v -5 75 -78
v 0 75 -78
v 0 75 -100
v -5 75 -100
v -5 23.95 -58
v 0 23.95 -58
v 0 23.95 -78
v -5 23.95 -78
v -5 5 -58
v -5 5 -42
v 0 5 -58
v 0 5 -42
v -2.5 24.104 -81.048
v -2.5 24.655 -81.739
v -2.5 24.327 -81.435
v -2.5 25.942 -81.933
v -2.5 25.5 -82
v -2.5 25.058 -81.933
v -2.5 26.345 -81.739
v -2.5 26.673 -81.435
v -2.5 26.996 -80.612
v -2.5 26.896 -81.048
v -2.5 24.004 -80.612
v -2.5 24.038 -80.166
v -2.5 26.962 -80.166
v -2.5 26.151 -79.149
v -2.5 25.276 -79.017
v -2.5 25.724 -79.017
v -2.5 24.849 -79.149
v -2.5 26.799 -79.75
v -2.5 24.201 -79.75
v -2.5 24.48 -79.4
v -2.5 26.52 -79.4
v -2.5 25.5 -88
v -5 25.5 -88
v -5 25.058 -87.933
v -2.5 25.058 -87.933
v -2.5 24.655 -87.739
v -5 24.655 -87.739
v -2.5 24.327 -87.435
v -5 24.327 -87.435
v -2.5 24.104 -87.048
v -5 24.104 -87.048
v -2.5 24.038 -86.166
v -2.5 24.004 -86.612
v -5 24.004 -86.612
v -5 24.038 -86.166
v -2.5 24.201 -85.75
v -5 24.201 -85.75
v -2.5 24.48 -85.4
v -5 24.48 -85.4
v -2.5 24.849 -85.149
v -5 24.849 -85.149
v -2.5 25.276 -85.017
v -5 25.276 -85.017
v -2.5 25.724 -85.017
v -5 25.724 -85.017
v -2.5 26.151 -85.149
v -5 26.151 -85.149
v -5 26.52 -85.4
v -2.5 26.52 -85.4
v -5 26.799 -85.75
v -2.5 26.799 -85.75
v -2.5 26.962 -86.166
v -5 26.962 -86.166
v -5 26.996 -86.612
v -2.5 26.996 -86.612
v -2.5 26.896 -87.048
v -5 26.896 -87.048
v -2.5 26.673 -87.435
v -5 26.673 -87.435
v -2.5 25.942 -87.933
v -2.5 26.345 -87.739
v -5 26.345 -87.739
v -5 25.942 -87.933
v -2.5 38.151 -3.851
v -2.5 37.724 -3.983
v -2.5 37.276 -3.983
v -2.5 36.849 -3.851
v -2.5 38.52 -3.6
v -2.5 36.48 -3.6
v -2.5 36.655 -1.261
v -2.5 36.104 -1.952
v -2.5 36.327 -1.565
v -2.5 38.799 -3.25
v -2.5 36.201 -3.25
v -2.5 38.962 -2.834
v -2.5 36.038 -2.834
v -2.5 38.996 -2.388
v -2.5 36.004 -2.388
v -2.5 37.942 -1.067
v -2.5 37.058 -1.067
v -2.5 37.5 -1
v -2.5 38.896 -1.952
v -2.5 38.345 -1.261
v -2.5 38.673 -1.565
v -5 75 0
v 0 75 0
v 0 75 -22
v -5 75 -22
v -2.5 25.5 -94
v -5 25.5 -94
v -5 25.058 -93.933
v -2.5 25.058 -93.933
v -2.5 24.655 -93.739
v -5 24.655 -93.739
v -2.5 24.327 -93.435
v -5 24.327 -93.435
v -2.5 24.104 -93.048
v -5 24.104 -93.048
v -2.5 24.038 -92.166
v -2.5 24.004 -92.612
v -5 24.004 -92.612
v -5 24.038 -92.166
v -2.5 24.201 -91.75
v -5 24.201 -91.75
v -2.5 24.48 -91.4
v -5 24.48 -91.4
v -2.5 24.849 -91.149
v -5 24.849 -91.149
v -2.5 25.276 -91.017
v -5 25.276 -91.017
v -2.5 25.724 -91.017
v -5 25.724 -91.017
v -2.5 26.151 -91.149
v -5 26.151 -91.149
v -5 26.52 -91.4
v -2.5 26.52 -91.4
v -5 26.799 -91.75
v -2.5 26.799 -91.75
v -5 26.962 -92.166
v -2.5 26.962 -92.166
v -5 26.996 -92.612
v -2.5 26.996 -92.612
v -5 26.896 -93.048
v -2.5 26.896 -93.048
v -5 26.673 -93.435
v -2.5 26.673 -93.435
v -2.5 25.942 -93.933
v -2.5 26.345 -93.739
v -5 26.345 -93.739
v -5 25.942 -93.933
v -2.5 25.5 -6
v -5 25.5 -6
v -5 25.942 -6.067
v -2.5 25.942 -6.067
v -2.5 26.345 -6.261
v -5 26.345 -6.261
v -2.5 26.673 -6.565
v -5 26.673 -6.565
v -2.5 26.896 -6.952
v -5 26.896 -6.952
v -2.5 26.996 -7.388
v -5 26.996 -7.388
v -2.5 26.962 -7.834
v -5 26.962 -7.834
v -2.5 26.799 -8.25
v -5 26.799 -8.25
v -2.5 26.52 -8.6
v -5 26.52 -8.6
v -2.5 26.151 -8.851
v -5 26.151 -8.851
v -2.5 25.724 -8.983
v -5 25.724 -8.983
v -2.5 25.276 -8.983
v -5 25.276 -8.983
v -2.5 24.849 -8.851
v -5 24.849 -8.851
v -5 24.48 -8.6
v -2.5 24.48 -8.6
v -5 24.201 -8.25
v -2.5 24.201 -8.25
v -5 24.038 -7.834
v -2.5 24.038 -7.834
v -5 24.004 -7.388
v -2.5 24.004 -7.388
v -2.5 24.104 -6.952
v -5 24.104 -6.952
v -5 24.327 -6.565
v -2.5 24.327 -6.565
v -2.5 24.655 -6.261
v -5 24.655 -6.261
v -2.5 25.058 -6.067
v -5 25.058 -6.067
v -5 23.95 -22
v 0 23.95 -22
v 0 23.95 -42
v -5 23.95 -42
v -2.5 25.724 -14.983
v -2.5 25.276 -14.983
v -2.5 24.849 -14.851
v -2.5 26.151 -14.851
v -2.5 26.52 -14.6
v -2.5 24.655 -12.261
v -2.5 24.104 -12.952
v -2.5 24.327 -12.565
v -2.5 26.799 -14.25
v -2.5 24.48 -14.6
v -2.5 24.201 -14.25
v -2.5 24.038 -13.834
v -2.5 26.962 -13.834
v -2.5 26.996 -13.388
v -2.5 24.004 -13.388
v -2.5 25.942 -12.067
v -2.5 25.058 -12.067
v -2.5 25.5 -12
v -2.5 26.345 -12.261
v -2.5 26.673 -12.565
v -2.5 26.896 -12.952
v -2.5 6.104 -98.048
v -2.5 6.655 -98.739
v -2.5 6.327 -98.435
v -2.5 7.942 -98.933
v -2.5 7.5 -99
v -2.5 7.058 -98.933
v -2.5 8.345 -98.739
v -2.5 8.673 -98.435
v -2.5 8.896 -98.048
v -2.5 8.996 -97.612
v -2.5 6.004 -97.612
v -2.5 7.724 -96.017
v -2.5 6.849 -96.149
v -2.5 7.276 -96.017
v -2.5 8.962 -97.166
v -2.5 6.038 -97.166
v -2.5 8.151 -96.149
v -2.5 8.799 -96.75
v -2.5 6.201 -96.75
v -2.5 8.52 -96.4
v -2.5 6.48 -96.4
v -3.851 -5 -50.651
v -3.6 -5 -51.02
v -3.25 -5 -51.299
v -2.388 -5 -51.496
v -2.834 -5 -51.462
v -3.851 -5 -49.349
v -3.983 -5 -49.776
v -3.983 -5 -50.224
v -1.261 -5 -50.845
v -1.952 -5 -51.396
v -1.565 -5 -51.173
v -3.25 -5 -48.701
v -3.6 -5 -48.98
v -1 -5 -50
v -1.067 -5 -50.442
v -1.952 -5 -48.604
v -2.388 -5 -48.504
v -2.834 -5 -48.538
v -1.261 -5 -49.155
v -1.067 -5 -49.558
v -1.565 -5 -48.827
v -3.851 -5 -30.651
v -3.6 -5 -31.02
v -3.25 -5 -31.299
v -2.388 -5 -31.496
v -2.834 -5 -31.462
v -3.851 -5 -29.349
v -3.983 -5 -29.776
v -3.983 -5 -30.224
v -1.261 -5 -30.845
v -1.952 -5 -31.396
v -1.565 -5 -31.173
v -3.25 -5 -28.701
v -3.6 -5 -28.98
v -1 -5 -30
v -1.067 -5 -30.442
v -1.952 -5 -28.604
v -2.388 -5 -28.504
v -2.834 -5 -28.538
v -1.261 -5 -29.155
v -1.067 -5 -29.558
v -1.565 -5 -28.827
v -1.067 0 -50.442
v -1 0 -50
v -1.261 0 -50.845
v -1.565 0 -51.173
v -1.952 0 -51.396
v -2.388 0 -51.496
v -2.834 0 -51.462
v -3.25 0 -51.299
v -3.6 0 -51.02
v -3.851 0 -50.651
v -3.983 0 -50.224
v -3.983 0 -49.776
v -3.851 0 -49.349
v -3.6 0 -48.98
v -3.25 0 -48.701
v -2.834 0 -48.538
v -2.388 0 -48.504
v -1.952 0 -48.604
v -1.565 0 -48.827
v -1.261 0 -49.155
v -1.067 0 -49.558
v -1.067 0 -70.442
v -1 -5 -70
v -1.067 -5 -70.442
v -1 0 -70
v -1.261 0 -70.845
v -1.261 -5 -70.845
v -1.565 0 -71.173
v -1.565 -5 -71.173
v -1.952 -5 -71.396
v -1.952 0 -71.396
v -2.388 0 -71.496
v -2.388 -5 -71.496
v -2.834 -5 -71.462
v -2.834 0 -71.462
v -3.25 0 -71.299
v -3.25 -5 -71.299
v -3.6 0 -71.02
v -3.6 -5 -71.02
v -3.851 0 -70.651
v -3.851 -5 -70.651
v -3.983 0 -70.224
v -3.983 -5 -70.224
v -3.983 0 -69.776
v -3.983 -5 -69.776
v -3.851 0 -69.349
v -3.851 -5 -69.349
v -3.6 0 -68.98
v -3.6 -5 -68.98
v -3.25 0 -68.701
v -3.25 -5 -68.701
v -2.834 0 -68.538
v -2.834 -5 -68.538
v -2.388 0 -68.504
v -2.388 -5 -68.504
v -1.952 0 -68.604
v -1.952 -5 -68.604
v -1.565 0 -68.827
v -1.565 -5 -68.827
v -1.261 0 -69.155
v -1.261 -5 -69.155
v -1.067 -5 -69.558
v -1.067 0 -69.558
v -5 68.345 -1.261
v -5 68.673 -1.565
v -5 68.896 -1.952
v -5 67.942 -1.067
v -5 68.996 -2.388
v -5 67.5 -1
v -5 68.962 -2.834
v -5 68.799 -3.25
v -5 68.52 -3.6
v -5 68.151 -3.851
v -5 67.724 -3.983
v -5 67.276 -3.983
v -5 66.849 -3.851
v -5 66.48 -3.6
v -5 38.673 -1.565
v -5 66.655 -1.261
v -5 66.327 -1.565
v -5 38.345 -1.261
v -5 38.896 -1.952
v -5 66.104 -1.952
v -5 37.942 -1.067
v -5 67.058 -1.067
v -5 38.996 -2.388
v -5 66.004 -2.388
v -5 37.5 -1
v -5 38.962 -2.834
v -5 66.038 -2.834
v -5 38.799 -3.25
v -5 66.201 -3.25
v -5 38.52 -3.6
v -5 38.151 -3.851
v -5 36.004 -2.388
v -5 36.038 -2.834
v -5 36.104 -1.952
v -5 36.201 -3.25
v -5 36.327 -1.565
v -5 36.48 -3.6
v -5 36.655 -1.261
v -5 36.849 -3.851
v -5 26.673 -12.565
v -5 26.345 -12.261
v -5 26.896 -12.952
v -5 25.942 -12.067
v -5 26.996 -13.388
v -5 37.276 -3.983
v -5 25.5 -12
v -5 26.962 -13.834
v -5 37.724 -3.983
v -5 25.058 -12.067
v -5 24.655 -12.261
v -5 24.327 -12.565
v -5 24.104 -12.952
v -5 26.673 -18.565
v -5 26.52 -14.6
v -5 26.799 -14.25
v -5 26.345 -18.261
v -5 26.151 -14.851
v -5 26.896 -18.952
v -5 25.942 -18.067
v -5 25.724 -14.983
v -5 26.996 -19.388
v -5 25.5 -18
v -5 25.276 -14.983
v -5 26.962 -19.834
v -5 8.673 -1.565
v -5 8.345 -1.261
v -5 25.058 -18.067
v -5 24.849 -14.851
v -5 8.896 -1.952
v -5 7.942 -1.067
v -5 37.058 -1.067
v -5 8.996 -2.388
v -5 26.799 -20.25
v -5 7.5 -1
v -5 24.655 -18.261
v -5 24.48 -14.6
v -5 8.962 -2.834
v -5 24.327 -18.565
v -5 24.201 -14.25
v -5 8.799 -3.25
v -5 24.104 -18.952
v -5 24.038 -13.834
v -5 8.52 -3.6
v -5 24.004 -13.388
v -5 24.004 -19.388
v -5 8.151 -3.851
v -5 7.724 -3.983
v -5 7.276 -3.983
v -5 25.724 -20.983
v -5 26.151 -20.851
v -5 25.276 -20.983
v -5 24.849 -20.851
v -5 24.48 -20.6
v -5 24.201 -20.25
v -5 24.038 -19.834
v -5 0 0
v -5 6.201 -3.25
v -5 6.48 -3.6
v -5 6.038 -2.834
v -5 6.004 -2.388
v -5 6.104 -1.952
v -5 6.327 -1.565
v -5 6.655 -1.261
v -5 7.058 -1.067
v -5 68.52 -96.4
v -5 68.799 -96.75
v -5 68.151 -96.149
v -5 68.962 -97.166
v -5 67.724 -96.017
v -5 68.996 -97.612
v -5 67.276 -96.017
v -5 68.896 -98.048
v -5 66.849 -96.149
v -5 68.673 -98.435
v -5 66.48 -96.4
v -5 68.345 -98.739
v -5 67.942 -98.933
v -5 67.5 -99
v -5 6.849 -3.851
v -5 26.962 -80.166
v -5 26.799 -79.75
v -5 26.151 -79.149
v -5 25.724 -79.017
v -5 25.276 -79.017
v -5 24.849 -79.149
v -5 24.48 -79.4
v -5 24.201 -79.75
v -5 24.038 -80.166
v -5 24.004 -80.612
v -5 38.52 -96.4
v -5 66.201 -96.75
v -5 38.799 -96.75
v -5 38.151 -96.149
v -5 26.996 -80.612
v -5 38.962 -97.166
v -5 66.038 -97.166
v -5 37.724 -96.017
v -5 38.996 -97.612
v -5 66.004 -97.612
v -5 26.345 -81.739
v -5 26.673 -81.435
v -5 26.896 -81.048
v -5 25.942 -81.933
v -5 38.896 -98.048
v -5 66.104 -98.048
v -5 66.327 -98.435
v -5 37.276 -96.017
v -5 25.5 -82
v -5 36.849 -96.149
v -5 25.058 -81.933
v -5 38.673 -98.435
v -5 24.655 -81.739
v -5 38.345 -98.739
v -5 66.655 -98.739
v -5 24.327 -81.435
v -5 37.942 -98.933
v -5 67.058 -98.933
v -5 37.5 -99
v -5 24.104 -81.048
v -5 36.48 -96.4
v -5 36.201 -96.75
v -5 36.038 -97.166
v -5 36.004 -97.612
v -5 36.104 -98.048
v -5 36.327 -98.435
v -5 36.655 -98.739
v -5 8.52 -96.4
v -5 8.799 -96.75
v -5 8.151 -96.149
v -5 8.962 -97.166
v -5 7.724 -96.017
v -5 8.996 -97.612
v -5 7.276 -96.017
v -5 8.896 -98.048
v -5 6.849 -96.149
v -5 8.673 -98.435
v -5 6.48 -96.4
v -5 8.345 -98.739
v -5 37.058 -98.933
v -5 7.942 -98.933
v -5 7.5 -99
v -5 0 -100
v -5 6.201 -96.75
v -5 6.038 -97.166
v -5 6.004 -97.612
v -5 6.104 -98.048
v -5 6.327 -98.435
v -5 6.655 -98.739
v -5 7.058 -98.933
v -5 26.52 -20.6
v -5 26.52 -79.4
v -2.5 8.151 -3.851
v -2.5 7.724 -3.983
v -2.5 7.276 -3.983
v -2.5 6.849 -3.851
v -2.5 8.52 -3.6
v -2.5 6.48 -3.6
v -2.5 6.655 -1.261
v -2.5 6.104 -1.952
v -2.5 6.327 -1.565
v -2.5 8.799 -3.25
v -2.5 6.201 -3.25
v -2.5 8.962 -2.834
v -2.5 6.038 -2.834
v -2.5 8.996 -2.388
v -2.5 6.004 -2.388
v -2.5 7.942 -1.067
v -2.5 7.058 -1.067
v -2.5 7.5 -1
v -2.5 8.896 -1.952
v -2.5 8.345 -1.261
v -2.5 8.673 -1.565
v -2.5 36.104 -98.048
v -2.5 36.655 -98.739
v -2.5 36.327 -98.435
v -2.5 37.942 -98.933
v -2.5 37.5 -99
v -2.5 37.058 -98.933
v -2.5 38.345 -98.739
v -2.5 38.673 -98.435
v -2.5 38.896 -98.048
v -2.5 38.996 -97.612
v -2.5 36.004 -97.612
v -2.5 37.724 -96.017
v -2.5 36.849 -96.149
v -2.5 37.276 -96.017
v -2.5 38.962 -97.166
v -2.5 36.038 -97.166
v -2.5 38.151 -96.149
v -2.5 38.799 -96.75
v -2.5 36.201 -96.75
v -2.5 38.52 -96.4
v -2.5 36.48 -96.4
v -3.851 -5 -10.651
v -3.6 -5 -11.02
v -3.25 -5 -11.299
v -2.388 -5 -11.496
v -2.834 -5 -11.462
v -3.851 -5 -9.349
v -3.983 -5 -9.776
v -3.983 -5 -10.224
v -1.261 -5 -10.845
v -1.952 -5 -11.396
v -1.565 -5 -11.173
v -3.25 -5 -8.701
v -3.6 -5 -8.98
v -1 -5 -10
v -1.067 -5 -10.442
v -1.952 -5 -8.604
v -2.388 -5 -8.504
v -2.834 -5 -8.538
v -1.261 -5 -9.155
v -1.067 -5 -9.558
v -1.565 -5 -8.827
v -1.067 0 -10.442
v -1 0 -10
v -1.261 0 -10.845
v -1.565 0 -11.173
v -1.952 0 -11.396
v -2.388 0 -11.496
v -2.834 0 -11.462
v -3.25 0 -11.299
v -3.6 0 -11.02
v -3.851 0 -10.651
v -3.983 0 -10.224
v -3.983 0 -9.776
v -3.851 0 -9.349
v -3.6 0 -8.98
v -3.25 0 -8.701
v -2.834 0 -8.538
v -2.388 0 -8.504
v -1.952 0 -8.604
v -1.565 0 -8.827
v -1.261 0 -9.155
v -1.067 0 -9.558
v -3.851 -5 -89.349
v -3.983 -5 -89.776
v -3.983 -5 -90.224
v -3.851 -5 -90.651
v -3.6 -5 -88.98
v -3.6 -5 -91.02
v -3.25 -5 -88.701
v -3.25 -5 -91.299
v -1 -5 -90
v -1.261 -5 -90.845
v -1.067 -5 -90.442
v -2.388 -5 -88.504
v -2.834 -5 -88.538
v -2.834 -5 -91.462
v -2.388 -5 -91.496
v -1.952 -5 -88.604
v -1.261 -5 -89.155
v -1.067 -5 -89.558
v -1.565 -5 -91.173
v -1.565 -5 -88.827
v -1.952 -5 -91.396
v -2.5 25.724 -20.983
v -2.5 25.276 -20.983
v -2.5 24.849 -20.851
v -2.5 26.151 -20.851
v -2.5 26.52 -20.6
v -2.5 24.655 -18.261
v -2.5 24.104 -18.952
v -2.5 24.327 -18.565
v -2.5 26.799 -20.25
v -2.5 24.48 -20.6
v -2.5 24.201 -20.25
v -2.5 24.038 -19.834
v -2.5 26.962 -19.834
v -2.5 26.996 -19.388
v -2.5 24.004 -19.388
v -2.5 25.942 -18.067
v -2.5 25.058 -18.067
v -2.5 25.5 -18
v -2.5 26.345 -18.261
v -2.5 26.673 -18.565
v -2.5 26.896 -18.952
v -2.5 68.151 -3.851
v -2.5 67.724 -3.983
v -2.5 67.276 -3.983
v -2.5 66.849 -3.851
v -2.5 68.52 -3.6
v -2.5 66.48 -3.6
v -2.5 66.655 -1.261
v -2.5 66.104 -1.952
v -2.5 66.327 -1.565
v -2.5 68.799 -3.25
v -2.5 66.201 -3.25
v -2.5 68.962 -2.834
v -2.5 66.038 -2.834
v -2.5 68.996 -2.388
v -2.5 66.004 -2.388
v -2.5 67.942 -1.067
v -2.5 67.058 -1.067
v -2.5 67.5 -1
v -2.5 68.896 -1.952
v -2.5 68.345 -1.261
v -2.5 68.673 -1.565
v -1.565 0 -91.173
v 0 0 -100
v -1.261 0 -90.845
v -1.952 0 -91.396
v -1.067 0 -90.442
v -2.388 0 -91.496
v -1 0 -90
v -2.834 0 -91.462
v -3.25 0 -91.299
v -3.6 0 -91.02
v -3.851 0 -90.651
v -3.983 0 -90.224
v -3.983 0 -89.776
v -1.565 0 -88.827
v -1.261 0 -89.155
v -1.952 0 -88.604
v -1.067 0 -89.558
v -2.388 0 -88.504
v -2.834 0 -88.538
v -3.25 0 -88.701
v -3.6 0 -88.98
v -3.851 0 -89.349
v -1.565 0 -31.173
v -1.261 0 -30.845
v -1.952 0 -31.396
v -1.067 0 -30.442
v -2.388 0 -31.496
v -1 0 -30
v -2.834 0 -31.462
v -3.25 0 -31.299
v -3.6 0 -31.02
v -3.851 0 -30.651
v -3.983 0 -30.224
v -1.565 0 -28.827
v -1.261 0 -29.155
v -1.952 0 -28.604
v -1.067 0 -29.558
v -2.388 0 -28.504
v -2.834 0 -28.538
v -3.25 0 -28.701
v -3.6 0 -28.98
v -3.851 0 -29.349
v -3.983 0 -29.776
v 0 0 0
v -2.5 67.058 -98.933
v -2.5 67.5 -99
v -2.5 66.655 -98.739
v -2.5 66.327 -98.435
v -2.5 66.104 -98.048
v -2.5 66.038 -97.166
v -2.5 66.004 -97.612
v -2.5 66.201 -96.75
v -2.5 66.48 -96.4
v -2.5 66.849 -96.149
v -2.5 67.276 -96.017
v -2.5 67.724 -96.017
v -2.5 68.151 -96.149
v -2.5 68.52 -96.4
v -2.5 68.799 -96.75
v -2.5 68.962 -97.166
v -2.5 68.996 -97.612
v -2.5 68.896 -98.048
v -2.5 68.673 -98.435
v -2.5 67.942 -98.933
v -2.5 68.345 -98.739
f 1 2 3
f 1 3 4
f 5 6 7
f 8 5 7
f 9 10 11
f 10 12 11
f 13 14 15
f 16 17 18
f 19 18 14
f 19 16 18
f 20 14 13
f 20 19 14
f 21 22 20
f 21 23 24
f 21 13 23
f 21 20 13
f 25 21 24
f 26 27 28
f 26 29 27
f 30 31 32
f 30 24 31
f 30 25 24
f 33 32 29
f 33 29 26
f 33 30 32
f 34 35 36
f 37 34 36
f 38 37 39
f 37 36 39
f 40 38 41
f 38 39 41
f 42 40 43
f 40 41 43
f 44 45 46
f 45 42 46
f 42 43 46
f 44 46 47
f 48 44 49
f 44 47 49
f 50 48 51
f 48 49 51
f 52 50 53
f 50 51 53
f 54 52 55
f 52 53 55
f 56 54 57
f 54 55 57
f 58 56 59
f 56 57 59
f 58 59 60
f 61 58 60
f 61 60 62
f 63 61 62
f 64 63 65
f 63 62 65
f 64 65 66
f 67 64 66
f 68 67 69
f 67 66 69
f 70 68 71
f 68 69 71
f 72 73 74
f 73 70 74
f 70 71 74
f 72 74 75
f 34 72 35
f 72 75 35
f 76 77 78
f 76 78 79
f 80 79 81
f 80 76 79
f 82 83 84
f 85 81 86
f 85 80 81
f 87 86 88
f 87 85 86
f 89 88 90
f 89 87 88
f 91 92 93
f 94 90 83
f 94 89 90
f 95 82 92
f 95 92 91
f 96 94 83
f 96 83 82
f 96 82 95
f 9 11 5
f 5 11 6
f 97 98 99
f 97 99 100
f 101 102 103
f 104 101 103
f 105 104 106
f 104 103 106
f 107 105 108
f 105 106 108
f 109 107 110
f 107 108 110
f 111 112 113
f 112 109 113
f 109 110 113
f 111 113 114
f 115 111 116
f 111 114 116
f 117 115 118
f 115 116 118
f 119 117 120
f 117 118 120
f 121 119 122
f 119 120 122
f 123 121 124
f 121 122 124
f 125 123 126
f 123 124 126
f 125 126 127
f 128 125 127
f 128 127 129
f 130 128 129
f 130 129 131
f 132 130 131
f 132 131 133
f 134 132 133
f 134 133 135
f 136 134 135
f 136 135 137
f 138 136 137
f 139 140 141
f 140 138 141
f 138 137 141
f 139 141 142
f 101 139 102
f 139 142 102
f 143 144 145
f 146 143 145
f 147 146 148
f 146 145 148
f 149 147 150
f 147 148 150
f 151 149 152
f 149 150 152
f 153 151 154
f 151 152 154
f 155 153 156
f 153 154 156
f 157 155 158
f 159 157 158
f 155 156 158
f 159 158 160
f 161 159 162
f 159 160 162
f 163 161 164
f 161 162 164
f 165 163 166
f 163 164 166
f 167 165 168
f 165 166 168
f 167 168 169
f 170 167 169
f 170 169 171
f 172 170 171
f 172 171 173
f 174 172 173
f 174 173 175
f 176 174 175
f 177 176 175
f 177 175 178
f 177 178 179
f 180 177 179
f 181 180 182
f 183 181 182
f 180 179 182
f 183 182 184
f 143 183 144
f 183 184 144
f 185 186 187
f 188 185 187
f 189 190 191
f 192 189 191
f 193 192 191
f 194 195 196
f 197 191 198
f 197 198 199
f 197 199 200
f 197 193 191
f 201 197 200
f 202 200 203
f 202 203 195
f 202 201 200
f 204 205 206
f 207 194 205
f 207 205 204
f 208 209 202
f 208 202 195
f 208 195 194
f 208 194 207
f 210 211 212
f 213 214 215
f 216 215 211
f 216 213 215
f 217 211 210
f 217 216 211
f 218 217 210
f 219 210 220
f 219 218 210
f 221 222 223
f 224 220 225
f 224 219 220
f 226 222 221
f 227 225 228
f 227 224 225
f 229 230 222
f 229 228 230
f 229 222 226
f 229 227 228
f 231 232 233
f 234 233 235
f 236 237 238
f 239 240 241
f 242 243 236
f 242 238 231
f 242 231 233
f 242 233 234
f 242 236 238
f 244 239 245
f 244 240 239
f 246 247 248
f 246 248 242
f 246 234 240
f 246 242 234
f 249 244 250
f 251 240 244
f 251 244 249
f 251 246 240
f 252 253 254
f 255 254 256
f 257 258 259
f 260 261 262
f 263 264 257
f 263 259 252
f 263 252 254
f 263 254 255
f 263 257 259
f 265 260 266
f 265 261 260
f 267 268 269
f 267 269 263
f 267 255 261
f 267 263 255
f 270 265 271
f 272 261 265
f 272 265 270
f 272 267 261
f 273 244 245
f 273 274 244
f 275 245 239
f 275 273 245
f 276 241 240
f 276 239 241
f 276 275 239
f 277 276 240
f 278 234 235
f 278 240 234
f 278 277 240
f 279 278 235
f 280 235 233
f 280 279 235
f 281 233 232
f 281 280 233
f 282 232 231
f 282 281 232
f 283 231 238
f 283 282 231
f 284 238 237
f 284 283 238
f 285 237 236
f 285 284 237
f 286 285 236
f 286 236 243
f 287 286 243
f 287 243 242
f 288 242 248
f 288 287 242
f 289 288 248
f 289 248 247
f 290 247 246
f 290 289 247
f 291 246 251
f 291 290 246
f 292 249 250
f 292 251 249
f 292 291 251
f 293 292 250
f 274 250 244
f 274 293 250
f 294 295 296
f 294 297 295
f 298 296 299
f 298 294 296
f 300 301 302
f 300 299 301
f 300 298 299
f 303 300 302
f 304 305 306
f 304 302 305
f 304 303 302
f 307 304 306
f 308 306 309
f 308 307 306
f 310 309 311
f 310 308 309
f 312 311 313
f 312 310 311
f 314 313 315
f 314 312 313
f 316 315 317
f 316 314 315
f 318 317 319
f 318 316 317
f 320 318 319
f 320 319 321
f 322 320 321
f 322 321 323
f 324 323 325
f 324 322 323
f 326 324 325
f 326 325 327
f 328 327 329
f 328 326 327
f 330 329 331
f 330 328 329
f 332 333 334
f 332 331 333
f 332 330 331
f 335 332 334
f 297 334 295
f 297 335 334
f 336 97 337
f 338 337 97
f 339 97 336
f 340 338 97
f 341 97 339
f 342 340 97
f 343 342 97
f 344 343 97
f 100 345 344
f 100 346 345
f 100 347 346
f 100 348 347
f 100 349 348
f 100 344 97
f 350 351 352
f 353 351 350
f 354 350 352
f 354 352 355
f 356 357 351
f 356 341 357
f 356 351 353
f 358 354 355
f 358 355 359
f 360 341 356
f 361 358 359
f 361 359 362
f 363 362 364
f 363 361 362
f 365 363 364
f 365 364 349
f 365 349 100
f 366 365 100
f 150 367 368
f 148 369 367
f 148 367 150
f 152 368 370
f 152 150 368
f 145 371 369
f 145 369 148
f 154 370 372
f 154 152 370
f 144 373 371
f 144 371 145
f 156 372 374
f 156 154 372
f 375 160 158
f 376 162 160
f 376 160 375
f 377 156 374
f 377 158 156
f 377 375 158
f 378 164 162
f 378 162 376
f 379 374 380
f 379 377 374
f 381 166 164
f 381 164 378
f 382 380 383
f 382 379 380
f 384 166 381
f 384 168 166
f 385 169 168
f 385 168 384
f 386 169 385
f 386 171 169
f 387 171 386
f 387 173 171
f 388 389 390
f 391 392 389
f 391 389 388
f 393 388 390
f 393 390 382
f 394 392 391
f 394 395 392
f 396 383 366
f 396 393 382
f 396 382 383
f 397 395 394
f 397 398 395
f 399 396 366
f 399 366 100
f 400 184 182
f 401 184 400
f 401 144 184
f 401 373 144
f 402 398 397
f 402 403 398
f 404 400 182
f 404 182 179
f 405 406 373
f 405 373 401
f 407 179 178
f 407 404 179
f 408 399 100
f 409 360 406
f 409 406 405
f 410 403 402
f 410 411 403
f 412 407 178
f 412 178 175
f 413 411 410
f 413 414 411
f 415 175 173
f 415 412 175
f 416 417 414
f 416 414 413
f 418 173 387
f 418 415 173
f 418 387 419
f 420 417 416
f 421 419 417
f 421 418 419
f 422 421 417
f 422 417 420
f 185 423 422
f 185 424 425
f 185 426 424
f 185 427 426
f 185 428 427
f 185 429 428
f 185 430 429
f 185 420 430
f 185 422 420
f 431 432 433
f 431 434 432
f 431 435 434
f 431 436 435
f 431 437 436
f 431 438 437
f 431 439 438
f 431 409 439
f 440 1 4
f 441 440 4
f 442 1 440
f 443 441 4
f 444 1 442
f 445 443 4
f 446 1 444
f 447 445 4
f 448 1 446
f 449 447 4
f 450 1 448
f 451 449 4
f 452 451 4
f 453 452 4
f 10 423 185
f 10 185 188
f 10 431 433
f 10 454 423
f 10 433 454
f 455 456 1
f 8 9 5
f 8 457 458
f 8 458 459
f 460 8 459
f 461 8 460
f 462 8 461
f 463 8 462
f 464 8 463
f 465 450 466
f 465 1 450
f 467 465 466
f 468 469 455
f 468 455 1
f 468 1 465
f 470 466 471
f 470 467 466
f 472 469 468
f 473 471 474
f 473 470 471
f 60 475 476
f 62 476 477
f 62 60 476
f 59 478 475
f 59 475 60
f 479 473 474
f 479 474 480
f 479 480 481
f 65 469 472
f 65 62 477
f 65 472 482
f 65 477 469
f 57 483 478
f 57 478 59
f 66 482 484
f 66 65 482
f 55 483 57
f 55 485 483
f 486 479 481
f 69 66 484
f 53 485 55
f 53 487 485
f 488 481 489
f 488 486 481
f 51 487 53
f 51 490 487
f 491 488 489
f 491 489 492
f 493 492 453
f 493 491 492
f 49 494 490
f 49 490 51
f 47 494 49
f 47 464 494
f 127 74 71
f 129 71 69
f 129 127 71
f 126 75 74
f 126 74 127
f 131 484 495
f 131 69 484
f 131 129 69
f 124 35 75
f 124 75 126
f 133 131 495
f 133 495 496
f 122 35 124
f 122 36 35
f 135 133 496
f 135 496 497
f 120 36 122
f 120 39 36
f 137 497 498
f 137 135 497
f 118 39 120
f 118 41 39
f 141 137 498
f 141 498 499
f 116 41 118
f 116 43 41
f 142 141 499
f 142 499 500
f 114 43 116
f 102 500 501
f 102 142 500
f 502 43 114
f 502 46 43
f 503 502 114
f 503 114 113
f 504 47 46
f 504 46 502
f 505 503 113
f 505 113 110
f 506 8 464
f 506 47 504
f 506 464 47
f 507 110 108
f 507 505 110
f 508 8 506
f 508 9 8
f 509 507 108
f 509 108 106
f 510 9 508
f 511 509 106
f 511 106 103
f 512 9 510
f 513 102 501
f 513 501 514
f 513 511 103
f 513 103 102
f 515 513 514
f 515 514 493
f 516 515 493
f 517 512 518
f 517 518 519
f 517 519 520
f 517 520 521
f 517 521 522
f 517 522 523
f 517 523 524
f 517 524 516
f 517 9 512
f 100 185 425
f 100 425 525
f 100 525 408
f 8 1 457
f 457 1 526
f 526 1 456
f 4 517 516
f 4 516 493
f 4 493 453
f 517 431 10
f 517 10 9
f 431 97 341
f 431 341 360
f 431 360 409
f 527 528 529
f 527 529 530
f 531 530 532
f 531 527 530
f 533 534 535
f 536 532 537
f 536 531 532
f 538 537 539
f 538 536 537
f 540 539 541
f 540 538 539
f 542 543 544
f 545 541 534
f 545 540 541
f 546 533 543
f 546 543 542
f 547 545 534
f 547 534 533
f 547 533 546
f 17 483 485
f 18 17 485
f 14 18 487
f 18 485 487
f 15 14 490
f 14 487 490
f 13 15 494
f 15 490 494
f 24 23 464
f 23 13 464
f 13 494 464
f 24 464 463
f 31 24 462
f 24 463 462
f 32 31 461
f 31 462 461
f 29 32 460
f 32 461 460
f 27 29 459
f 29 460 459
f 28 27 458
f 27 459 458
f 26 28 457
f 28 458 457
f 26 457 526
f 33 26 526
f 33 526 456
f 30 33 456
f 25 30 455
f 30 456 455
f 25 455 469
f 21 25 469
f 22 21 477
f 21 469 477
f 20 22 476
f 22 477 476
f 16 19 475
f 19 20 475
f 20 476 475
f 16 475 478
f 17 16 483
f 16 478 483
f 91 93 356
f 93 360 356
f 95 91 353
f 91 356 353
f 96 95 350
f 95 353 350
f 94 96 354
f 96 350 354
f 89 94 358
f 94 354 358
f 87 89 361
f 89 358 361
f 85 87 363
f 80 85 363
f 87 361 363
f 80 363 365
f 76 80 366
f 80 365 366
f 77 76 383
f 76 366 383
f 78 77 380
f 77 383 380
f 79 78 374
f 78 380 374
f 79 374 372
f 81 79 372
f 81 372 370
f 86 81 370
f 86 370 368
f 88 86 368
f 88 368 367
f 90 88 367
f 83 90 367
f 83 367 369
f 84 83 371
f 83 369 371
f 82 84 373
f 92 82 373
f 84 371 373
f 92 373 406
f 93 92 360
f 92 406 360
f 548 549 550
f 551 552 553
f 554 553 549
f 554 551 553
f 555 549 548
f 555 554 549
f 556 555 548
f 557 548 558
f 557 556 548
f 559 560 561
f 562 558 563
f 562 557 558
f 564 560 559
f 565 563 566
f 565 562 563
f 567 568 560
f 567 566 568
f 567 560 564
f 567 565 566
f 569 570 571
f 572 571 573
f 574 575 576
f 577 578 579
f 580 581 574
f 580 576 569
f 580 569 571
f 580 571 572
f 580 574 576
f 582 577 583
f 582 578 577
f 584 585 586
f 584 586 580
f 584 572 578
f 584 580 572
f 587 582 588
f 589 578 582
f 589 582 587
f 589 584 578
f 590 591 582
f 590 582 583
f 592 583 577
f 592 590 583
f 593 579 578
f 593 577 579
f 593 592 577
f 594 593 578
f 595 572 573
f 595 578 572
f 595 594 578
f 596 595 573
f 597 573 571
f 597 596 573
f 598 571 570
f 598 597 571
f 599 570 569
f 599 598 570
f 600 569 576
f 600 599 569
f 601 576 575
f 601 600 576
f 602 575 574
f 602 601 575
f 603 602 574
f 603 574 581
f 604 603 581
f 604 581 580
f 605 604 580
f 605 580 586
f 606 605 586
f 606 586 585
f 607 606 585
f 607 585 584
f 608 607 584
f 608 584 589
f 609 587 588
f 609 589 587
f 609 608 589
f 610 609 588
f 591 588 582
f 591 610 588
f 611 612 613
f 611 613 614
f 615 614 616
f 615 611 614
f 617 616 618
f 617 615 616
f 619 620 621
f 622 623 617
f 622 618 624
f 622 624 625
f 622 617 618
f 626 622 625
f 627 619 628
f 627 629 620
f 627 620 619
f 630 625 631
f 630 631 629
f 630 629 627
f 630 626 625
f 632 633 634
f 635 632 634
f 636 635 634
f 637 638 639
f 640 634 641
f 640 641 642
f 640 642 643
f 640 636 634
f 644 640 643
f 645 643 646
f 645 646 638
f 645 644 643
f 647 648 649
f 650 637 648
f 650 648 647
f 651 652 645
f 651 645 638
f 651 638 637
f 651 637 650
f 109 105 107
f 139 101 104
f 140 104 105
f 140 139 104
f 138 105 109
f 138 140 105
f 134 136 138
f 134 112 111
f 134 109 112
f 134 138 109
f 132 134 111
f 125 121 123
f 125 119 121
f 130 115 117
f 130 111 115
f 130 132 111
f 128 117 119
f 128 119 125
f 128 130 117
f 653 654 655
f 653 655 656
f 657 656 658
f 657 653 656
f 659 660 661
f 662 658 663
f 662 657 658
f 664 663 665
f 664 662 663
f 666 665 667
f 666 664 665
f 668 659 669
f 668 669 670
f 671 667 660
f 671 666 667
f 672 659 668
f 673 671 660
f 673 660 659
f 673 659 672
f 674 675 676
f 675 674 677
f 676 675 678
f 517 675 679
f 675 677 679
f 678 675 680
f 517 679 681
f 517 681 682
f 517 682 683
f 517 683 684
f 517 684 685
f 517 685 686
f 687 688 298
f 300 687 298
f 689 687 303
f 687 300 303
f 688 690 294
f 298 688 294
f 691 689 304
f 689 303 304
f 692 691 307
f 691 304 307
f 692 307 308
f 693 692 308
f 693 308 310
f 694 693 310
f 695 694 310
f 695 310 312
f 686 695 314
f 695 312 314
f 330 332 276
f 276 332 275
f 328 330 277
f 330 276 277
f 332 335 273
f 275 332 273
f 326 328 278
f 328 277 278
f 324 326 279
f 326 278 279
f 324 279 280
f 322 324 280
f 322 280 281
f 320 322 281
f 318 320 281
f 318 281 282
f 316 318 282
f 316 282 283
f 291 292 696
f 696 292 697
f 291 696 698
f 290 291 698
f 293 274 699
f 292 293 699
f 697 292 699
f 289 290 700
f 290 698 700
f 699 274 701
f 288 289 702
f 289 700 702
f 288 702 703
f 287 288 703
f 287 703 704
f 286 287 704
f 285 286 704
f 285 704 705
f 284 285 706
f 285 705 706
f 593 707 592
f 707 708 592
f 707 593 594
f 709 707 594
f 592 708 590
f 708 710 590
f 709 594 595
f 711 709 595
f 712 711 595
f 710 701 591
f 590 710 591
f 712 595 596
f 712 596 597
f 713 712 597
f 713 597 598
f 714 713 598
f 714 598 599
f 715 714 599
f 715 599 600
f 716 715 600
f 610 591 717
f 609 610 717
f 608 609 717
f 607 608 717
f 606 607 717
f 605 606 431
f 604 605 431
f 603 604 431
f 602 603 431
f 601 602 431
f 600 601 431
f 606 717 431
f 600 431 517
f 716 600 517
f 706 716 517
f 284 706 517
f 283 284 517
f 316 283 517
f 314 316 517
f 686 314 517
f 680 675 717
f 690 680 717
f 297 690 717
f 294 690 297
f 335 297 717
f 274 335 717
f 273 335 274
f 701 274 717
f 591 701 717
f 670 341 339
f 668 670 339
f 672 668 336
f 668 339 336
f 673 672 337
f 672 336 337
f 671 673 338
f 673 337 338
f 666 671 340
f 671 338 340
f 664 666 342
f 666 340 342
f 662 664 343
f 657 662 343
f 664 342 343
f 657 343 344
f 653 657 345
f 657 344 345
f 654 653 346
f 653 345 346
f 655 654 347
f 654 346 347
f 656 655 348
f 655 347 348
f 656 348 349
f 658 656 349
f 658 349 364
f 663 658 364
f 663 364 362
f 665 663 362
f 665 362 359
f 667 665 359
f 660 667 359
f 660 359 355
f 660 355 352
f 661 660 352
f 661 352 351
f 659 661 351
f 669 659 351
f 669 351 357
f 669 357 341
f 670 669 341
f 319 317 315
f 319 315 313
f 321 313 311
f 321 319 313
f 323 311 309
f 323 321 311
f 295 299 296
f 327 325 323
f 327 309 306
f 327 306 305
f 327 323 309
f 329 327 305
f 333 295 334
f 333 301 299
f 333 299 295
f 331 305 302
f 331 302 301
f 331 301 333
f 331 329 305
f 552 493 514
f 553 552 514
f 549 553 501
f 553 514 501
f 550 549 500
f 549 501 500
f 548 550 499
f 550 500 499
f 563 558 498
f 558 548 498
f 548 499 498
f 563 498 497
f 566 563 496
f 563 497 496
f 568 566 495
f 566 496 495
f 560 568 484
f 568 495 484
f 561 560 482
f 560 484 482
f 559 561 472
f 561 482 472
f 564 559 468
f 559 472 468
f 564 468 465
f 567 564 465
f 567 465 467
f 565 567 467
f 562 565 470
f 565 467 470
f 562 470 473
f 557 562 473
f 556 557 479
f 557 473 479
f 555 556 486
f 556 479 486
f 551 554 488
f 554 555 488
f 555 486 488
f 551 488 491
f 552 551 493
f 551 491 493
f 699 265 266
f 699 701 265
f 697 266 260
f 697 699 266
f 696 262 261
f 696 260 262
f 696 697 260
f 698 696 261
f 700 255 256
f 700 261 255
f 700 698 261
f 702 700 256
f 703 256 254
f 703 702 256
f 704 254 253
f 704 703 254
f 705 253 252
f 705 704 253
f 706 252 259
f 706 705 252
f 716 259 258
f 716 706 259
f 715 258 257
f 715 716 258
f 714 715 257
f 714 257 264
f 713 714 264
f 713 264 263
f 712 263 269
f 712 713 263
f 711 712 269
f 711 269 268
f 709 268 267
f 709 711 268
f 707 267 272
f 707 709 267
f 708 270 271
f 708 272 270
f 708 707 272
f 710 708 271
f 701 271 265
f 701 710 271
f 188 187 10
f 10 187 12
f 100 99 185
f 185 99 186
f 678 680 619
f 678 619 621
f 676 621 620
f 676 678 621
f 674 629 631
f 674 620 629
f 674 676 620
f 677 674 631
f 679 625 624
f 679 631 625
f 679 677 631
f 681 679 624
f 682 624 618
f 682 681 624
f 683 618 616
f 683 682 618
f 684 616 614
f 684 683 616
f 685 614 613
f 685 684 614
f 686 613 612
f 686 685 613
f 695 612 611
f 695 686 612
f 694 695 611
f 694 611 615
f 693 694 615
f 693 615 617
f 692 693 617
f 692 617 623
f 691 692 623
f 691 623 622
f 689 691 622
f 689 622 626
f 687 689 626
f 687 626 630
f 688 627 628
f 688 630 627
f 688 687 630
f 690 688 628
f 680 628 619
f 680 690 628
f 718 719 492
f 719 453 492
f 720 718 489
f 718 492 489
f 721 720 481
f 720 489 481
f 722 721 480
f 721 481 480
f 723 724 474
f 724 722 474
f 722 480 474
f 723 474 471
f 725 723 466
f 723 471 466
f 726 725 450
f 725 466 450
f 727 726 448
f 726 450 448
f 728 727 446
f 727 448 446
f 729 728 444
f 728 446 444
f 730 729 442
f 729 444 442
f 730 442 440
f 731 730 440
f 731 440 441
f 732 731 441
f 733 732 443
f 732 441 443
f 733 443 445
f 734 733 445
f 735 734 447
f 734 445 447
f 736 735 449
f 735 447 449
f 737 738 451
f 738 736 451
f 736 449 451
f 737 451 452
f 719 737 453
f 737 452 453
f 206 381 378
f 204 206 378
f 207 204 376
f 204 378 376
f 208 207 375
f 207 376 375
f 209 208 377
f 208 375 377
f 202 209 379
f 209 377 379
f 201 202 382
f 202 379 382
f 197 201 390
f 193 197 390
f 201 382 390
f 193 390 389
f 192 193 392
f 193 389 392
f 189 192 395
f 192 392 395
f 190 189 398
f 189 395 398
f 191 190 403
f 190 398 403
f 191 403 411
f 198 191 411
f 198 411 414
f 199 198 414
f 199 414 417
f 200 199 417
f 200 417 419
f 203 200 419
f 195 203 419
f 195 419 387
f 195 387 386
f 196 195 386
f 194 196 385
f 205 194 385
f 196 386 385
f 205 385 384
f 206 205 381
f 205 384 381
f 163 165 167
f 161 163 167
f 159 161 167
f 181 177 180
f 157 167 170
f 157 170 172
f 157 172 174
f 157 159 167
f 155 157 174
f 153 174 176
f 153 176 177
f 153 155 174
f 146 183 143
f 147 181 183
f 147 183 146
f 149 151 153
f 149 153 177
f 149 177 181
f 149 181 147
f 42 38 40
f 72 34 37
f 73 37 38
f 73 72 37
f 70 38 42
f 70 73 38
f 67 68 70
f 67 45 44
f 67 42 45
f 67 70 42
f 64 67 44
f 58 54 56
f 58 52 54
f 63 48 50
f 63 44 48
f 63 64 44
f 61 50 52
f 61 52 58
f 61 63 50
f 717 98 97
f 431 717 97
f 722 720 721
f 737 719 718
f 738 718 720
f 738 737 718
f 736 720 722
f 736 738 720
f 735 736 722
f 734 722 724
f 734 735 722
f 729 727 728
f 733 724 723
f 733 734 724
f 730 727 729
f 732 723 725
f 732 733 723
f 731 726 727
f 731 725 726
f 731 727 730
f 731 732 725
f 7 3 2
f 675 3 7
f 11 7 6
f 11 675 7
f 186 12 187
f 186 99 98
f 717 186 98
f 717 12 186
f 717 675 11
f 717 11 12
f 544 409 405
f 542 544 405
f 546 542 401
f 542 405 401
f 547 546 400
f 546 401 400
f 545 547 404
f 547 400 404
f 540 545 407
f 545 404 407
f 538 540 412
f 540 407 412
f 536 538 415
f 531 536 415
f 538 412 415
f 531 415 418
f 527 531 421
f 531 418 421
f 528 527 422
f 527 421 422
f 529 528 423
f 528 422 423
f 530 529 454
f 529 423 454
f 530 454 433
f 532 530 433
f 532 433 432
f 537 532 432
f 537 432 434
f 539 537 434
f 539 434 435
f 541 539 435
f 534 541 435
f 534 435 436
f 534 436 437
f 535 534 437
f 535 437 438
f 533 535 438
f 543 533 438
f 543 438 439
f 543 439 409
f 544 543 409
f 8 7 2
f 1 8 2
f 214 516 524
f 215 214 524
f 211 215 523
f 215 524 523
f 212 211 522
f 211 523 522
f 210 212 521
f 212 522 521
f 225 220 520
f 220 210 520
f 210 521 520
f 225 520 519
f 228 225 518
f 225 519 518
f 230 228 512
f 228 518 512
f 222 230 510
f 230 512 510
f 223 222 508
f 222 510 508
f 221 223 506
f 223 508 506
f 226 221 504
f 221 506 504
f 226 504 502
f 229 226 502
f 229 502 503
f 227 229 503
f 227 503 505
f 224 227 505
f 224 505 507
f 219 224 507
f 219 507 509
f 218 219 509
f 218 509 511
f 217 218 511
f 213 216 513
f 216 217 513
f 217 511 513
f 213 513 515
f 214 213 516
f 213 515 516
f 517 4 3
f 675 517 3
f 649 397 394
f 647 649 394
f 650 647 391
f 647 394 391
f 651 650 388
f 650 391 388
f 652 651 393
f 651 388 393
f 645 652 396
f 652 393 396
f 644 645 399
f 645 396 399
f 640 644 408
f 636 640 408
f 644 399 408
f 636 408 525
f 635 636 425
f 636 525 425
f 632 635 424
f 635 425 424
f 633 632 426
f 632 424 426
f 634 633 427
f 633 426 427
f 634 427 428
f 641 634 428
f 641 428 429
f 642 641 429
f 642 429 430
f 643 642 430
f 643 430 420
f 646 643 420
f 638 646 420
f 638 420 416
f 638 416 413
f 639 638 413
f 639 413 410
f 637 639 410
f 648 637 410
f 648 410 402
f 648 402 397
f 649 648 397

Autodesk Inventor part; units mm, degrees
ref_plane "YZ Plane" through (0, 0, 0) normal (1, 0, 0) x (0, 1, 0)
ref_plane "XZ Plane" through (0, 0, 0) normal (0, 1, 0) x (-1, 0, 0)
sketch "Sketch2" plane through (0, 0, 0) normal (0, 1, 0) x (-1, 0, 0)
  line L0 (0, 0) -> (5, 0)
  line L1 (5, 0) -> (5, -100)
  line L2 (5, -100) -> (0, -100)
  line L3 (0, -100) -> (0, 0)
  dimension "d0" = 5
  dimension "d1" = 100
extrude "Extrusion1" add sketch "Sketch2" along normal blind 75
sketch "Sketch5" plane through (0, 0, 0) normal (1, 0, 0) x (0, 0, -1)
  line L0 (0, 75) -> (100, 75) projected
  line L1 (22, 23.95) -> (42, 23.95)
  line L2 (42, 23.95) -> (42, 75)
  line L3 (42, 75) -> (22, 75)
  line L4 (22, 75) -> (22, 23.95)
  line L5 (58, 23.95) -> (78, 23.95)
  line L6 (78, 23.95) -> (78, 75)
  line L7 (78, 75) -> (58, 75)
  line L8 (58, 75) -> (58, 23.95)
  line L9 (0, 0) -> (0, 75) projected
  line L10 (100, 0) -> (100, 75) projected
  line L11 (100, 0) -> (0, 0) projected
  dimension "d16" = 16
  dimension "d17" = 22
  dimension "d18" = 22
  dimension "d20" = 23.95
extrude "Extrusion4" cut sketch "Sketch5" against normal through all contours L0 L2 L1 L4 | L0 L6 L5 L8
sketch "Sketch6" plane through (0, 0, 0) normal (1, 0, 0) x (0, 0, -1)
  line L0 (58, 23.95) -> (58, 75) projected
  line L1 (42, 5) -> (58, 5)
  line L2 (58, 5) -> (58, 75)
  line L3 (58, 75) -> (42, 75)
  line L4 (42, 75) -> (42, 5)
  line L5 (42, 75) -> (42, 23.95) projected
  point P0 (0, 0)
  dimension "d26" = 70
extrude "Extrusion5" cut sketch "Sketch6" against normal through all
sketch "Sketch7" plane through (0, 0, 0) normal (0, -1, 0) x (1, 0, 0)
  circle A0 centre (-2.5, -10) radius 1.5
  line L0 (0, 0) -> (-5, 0) projected
  line L1 (-5, 0) -> (-5, -100) projected
  dimension "d27" = 3
  dimension "d28" = 10
  dimension "d29" = 2.5
extrude "Extrusion6" add sketch "Sketch7" along normal blind 5
pattern_linear "Rectangular Pattern1" count 5 spacing 20 along (0, 0, -1) of "Extrusion6"
ref_plane "Work Plane1" through (-5, 0, -50) normal (0, 0, 1) x (1, 0, 0)
sketch "Sketch9" plane through (-5, -6.2824, -100) normal (-1, 0, 0) x (0, 0, 1)
  line L0 (100, 6.2824) -> (100, 75)
  line L1 (0, 29.2824) -> (100, 29.2824)
  line L2 (100, 29.2824) -> (100, 34.2824)
  line L3 (100, 34.2824) -> (0, 34.2824)
  line L4 (0, 34.2824) -> (0, 29.2824)
  circle A0 centre (92.5, 31.7824) radius 1.5
  line L5 (78, 75) -> (78, 23.95)
  line L6 (100, 75) -> (78, 75)
  line L7 (100, 6.2824) -> (95, 6.2824)
  line L8 (95, 6.2824) -> (95, 75)
  line L9 (95, 75) -> (100, 75)
  line L10 (100, 75) -> (100, 6.2824)
  line L11 (0, 75) -> (22, 75)
  line L12 (0, 0) -> (5, 0)
  line L13 (5, 0) -> (5, 75)
  line L14 (5, 75) -> (0, 75)
  line L15 (0, 75) -> (0, 0)
  point P0 (97.5, 6.2824)
  point P1 (100, 6.2824)
  dimension "d59" = 5
  dimension "d56" = 3
  dimension "d55" = 5
  dimension "d53" = 5
  dimension "d57" = 2.5
  dimension "d54" = 2.5
  dimension "d66" = 23
extrude "Extrusion8" cut sketch "Sketch9" against normal blind 2.5 contours A0
pattern_linear "Rectangular Pattern3" count 3 spacing 6 along (0, 0, -1) of "Extrusion8"
mirror "Mirror2" about plane through (-5, 0, -50) normal (0, 0, 1) of "Extrusion8", "Rectangular Pattern3"
sketch "Sketch10" plane through (-5, 0, -100) normal (-1, 0, 0) x (0, 0, 1)
  line L0 (78, 75) -> (100, 75) projected
  line L1 (100, 0) -> (95, 0)
  line L2 (95, 0) -> (95, 75)
  line L3 (95, 75) -> (100, 75)
  line L4 (100, 75) -> (100, 0)
  circle A0 centre (97.5, 7.5) radius 1.5
  dimension "d67" = 5
  dimension "d68" = 3
  dimension "d69" = 2.5
  dimension "d70" = 7.5
extrude "Extrusion9" cut sketch "Sketch10" against normal blind 2.5 contours A0
pattern_linear "Rectangular Pattern4" count 3 spacing 30 along (0, 1, 0) of "Extrusion9"
mirror "Mirror3" about plane through (-5, 0, -50) normal (0, 0, 1) of "Extrusion9", "Rectangular Pattern4"
properties part number "Back Plate V3"
